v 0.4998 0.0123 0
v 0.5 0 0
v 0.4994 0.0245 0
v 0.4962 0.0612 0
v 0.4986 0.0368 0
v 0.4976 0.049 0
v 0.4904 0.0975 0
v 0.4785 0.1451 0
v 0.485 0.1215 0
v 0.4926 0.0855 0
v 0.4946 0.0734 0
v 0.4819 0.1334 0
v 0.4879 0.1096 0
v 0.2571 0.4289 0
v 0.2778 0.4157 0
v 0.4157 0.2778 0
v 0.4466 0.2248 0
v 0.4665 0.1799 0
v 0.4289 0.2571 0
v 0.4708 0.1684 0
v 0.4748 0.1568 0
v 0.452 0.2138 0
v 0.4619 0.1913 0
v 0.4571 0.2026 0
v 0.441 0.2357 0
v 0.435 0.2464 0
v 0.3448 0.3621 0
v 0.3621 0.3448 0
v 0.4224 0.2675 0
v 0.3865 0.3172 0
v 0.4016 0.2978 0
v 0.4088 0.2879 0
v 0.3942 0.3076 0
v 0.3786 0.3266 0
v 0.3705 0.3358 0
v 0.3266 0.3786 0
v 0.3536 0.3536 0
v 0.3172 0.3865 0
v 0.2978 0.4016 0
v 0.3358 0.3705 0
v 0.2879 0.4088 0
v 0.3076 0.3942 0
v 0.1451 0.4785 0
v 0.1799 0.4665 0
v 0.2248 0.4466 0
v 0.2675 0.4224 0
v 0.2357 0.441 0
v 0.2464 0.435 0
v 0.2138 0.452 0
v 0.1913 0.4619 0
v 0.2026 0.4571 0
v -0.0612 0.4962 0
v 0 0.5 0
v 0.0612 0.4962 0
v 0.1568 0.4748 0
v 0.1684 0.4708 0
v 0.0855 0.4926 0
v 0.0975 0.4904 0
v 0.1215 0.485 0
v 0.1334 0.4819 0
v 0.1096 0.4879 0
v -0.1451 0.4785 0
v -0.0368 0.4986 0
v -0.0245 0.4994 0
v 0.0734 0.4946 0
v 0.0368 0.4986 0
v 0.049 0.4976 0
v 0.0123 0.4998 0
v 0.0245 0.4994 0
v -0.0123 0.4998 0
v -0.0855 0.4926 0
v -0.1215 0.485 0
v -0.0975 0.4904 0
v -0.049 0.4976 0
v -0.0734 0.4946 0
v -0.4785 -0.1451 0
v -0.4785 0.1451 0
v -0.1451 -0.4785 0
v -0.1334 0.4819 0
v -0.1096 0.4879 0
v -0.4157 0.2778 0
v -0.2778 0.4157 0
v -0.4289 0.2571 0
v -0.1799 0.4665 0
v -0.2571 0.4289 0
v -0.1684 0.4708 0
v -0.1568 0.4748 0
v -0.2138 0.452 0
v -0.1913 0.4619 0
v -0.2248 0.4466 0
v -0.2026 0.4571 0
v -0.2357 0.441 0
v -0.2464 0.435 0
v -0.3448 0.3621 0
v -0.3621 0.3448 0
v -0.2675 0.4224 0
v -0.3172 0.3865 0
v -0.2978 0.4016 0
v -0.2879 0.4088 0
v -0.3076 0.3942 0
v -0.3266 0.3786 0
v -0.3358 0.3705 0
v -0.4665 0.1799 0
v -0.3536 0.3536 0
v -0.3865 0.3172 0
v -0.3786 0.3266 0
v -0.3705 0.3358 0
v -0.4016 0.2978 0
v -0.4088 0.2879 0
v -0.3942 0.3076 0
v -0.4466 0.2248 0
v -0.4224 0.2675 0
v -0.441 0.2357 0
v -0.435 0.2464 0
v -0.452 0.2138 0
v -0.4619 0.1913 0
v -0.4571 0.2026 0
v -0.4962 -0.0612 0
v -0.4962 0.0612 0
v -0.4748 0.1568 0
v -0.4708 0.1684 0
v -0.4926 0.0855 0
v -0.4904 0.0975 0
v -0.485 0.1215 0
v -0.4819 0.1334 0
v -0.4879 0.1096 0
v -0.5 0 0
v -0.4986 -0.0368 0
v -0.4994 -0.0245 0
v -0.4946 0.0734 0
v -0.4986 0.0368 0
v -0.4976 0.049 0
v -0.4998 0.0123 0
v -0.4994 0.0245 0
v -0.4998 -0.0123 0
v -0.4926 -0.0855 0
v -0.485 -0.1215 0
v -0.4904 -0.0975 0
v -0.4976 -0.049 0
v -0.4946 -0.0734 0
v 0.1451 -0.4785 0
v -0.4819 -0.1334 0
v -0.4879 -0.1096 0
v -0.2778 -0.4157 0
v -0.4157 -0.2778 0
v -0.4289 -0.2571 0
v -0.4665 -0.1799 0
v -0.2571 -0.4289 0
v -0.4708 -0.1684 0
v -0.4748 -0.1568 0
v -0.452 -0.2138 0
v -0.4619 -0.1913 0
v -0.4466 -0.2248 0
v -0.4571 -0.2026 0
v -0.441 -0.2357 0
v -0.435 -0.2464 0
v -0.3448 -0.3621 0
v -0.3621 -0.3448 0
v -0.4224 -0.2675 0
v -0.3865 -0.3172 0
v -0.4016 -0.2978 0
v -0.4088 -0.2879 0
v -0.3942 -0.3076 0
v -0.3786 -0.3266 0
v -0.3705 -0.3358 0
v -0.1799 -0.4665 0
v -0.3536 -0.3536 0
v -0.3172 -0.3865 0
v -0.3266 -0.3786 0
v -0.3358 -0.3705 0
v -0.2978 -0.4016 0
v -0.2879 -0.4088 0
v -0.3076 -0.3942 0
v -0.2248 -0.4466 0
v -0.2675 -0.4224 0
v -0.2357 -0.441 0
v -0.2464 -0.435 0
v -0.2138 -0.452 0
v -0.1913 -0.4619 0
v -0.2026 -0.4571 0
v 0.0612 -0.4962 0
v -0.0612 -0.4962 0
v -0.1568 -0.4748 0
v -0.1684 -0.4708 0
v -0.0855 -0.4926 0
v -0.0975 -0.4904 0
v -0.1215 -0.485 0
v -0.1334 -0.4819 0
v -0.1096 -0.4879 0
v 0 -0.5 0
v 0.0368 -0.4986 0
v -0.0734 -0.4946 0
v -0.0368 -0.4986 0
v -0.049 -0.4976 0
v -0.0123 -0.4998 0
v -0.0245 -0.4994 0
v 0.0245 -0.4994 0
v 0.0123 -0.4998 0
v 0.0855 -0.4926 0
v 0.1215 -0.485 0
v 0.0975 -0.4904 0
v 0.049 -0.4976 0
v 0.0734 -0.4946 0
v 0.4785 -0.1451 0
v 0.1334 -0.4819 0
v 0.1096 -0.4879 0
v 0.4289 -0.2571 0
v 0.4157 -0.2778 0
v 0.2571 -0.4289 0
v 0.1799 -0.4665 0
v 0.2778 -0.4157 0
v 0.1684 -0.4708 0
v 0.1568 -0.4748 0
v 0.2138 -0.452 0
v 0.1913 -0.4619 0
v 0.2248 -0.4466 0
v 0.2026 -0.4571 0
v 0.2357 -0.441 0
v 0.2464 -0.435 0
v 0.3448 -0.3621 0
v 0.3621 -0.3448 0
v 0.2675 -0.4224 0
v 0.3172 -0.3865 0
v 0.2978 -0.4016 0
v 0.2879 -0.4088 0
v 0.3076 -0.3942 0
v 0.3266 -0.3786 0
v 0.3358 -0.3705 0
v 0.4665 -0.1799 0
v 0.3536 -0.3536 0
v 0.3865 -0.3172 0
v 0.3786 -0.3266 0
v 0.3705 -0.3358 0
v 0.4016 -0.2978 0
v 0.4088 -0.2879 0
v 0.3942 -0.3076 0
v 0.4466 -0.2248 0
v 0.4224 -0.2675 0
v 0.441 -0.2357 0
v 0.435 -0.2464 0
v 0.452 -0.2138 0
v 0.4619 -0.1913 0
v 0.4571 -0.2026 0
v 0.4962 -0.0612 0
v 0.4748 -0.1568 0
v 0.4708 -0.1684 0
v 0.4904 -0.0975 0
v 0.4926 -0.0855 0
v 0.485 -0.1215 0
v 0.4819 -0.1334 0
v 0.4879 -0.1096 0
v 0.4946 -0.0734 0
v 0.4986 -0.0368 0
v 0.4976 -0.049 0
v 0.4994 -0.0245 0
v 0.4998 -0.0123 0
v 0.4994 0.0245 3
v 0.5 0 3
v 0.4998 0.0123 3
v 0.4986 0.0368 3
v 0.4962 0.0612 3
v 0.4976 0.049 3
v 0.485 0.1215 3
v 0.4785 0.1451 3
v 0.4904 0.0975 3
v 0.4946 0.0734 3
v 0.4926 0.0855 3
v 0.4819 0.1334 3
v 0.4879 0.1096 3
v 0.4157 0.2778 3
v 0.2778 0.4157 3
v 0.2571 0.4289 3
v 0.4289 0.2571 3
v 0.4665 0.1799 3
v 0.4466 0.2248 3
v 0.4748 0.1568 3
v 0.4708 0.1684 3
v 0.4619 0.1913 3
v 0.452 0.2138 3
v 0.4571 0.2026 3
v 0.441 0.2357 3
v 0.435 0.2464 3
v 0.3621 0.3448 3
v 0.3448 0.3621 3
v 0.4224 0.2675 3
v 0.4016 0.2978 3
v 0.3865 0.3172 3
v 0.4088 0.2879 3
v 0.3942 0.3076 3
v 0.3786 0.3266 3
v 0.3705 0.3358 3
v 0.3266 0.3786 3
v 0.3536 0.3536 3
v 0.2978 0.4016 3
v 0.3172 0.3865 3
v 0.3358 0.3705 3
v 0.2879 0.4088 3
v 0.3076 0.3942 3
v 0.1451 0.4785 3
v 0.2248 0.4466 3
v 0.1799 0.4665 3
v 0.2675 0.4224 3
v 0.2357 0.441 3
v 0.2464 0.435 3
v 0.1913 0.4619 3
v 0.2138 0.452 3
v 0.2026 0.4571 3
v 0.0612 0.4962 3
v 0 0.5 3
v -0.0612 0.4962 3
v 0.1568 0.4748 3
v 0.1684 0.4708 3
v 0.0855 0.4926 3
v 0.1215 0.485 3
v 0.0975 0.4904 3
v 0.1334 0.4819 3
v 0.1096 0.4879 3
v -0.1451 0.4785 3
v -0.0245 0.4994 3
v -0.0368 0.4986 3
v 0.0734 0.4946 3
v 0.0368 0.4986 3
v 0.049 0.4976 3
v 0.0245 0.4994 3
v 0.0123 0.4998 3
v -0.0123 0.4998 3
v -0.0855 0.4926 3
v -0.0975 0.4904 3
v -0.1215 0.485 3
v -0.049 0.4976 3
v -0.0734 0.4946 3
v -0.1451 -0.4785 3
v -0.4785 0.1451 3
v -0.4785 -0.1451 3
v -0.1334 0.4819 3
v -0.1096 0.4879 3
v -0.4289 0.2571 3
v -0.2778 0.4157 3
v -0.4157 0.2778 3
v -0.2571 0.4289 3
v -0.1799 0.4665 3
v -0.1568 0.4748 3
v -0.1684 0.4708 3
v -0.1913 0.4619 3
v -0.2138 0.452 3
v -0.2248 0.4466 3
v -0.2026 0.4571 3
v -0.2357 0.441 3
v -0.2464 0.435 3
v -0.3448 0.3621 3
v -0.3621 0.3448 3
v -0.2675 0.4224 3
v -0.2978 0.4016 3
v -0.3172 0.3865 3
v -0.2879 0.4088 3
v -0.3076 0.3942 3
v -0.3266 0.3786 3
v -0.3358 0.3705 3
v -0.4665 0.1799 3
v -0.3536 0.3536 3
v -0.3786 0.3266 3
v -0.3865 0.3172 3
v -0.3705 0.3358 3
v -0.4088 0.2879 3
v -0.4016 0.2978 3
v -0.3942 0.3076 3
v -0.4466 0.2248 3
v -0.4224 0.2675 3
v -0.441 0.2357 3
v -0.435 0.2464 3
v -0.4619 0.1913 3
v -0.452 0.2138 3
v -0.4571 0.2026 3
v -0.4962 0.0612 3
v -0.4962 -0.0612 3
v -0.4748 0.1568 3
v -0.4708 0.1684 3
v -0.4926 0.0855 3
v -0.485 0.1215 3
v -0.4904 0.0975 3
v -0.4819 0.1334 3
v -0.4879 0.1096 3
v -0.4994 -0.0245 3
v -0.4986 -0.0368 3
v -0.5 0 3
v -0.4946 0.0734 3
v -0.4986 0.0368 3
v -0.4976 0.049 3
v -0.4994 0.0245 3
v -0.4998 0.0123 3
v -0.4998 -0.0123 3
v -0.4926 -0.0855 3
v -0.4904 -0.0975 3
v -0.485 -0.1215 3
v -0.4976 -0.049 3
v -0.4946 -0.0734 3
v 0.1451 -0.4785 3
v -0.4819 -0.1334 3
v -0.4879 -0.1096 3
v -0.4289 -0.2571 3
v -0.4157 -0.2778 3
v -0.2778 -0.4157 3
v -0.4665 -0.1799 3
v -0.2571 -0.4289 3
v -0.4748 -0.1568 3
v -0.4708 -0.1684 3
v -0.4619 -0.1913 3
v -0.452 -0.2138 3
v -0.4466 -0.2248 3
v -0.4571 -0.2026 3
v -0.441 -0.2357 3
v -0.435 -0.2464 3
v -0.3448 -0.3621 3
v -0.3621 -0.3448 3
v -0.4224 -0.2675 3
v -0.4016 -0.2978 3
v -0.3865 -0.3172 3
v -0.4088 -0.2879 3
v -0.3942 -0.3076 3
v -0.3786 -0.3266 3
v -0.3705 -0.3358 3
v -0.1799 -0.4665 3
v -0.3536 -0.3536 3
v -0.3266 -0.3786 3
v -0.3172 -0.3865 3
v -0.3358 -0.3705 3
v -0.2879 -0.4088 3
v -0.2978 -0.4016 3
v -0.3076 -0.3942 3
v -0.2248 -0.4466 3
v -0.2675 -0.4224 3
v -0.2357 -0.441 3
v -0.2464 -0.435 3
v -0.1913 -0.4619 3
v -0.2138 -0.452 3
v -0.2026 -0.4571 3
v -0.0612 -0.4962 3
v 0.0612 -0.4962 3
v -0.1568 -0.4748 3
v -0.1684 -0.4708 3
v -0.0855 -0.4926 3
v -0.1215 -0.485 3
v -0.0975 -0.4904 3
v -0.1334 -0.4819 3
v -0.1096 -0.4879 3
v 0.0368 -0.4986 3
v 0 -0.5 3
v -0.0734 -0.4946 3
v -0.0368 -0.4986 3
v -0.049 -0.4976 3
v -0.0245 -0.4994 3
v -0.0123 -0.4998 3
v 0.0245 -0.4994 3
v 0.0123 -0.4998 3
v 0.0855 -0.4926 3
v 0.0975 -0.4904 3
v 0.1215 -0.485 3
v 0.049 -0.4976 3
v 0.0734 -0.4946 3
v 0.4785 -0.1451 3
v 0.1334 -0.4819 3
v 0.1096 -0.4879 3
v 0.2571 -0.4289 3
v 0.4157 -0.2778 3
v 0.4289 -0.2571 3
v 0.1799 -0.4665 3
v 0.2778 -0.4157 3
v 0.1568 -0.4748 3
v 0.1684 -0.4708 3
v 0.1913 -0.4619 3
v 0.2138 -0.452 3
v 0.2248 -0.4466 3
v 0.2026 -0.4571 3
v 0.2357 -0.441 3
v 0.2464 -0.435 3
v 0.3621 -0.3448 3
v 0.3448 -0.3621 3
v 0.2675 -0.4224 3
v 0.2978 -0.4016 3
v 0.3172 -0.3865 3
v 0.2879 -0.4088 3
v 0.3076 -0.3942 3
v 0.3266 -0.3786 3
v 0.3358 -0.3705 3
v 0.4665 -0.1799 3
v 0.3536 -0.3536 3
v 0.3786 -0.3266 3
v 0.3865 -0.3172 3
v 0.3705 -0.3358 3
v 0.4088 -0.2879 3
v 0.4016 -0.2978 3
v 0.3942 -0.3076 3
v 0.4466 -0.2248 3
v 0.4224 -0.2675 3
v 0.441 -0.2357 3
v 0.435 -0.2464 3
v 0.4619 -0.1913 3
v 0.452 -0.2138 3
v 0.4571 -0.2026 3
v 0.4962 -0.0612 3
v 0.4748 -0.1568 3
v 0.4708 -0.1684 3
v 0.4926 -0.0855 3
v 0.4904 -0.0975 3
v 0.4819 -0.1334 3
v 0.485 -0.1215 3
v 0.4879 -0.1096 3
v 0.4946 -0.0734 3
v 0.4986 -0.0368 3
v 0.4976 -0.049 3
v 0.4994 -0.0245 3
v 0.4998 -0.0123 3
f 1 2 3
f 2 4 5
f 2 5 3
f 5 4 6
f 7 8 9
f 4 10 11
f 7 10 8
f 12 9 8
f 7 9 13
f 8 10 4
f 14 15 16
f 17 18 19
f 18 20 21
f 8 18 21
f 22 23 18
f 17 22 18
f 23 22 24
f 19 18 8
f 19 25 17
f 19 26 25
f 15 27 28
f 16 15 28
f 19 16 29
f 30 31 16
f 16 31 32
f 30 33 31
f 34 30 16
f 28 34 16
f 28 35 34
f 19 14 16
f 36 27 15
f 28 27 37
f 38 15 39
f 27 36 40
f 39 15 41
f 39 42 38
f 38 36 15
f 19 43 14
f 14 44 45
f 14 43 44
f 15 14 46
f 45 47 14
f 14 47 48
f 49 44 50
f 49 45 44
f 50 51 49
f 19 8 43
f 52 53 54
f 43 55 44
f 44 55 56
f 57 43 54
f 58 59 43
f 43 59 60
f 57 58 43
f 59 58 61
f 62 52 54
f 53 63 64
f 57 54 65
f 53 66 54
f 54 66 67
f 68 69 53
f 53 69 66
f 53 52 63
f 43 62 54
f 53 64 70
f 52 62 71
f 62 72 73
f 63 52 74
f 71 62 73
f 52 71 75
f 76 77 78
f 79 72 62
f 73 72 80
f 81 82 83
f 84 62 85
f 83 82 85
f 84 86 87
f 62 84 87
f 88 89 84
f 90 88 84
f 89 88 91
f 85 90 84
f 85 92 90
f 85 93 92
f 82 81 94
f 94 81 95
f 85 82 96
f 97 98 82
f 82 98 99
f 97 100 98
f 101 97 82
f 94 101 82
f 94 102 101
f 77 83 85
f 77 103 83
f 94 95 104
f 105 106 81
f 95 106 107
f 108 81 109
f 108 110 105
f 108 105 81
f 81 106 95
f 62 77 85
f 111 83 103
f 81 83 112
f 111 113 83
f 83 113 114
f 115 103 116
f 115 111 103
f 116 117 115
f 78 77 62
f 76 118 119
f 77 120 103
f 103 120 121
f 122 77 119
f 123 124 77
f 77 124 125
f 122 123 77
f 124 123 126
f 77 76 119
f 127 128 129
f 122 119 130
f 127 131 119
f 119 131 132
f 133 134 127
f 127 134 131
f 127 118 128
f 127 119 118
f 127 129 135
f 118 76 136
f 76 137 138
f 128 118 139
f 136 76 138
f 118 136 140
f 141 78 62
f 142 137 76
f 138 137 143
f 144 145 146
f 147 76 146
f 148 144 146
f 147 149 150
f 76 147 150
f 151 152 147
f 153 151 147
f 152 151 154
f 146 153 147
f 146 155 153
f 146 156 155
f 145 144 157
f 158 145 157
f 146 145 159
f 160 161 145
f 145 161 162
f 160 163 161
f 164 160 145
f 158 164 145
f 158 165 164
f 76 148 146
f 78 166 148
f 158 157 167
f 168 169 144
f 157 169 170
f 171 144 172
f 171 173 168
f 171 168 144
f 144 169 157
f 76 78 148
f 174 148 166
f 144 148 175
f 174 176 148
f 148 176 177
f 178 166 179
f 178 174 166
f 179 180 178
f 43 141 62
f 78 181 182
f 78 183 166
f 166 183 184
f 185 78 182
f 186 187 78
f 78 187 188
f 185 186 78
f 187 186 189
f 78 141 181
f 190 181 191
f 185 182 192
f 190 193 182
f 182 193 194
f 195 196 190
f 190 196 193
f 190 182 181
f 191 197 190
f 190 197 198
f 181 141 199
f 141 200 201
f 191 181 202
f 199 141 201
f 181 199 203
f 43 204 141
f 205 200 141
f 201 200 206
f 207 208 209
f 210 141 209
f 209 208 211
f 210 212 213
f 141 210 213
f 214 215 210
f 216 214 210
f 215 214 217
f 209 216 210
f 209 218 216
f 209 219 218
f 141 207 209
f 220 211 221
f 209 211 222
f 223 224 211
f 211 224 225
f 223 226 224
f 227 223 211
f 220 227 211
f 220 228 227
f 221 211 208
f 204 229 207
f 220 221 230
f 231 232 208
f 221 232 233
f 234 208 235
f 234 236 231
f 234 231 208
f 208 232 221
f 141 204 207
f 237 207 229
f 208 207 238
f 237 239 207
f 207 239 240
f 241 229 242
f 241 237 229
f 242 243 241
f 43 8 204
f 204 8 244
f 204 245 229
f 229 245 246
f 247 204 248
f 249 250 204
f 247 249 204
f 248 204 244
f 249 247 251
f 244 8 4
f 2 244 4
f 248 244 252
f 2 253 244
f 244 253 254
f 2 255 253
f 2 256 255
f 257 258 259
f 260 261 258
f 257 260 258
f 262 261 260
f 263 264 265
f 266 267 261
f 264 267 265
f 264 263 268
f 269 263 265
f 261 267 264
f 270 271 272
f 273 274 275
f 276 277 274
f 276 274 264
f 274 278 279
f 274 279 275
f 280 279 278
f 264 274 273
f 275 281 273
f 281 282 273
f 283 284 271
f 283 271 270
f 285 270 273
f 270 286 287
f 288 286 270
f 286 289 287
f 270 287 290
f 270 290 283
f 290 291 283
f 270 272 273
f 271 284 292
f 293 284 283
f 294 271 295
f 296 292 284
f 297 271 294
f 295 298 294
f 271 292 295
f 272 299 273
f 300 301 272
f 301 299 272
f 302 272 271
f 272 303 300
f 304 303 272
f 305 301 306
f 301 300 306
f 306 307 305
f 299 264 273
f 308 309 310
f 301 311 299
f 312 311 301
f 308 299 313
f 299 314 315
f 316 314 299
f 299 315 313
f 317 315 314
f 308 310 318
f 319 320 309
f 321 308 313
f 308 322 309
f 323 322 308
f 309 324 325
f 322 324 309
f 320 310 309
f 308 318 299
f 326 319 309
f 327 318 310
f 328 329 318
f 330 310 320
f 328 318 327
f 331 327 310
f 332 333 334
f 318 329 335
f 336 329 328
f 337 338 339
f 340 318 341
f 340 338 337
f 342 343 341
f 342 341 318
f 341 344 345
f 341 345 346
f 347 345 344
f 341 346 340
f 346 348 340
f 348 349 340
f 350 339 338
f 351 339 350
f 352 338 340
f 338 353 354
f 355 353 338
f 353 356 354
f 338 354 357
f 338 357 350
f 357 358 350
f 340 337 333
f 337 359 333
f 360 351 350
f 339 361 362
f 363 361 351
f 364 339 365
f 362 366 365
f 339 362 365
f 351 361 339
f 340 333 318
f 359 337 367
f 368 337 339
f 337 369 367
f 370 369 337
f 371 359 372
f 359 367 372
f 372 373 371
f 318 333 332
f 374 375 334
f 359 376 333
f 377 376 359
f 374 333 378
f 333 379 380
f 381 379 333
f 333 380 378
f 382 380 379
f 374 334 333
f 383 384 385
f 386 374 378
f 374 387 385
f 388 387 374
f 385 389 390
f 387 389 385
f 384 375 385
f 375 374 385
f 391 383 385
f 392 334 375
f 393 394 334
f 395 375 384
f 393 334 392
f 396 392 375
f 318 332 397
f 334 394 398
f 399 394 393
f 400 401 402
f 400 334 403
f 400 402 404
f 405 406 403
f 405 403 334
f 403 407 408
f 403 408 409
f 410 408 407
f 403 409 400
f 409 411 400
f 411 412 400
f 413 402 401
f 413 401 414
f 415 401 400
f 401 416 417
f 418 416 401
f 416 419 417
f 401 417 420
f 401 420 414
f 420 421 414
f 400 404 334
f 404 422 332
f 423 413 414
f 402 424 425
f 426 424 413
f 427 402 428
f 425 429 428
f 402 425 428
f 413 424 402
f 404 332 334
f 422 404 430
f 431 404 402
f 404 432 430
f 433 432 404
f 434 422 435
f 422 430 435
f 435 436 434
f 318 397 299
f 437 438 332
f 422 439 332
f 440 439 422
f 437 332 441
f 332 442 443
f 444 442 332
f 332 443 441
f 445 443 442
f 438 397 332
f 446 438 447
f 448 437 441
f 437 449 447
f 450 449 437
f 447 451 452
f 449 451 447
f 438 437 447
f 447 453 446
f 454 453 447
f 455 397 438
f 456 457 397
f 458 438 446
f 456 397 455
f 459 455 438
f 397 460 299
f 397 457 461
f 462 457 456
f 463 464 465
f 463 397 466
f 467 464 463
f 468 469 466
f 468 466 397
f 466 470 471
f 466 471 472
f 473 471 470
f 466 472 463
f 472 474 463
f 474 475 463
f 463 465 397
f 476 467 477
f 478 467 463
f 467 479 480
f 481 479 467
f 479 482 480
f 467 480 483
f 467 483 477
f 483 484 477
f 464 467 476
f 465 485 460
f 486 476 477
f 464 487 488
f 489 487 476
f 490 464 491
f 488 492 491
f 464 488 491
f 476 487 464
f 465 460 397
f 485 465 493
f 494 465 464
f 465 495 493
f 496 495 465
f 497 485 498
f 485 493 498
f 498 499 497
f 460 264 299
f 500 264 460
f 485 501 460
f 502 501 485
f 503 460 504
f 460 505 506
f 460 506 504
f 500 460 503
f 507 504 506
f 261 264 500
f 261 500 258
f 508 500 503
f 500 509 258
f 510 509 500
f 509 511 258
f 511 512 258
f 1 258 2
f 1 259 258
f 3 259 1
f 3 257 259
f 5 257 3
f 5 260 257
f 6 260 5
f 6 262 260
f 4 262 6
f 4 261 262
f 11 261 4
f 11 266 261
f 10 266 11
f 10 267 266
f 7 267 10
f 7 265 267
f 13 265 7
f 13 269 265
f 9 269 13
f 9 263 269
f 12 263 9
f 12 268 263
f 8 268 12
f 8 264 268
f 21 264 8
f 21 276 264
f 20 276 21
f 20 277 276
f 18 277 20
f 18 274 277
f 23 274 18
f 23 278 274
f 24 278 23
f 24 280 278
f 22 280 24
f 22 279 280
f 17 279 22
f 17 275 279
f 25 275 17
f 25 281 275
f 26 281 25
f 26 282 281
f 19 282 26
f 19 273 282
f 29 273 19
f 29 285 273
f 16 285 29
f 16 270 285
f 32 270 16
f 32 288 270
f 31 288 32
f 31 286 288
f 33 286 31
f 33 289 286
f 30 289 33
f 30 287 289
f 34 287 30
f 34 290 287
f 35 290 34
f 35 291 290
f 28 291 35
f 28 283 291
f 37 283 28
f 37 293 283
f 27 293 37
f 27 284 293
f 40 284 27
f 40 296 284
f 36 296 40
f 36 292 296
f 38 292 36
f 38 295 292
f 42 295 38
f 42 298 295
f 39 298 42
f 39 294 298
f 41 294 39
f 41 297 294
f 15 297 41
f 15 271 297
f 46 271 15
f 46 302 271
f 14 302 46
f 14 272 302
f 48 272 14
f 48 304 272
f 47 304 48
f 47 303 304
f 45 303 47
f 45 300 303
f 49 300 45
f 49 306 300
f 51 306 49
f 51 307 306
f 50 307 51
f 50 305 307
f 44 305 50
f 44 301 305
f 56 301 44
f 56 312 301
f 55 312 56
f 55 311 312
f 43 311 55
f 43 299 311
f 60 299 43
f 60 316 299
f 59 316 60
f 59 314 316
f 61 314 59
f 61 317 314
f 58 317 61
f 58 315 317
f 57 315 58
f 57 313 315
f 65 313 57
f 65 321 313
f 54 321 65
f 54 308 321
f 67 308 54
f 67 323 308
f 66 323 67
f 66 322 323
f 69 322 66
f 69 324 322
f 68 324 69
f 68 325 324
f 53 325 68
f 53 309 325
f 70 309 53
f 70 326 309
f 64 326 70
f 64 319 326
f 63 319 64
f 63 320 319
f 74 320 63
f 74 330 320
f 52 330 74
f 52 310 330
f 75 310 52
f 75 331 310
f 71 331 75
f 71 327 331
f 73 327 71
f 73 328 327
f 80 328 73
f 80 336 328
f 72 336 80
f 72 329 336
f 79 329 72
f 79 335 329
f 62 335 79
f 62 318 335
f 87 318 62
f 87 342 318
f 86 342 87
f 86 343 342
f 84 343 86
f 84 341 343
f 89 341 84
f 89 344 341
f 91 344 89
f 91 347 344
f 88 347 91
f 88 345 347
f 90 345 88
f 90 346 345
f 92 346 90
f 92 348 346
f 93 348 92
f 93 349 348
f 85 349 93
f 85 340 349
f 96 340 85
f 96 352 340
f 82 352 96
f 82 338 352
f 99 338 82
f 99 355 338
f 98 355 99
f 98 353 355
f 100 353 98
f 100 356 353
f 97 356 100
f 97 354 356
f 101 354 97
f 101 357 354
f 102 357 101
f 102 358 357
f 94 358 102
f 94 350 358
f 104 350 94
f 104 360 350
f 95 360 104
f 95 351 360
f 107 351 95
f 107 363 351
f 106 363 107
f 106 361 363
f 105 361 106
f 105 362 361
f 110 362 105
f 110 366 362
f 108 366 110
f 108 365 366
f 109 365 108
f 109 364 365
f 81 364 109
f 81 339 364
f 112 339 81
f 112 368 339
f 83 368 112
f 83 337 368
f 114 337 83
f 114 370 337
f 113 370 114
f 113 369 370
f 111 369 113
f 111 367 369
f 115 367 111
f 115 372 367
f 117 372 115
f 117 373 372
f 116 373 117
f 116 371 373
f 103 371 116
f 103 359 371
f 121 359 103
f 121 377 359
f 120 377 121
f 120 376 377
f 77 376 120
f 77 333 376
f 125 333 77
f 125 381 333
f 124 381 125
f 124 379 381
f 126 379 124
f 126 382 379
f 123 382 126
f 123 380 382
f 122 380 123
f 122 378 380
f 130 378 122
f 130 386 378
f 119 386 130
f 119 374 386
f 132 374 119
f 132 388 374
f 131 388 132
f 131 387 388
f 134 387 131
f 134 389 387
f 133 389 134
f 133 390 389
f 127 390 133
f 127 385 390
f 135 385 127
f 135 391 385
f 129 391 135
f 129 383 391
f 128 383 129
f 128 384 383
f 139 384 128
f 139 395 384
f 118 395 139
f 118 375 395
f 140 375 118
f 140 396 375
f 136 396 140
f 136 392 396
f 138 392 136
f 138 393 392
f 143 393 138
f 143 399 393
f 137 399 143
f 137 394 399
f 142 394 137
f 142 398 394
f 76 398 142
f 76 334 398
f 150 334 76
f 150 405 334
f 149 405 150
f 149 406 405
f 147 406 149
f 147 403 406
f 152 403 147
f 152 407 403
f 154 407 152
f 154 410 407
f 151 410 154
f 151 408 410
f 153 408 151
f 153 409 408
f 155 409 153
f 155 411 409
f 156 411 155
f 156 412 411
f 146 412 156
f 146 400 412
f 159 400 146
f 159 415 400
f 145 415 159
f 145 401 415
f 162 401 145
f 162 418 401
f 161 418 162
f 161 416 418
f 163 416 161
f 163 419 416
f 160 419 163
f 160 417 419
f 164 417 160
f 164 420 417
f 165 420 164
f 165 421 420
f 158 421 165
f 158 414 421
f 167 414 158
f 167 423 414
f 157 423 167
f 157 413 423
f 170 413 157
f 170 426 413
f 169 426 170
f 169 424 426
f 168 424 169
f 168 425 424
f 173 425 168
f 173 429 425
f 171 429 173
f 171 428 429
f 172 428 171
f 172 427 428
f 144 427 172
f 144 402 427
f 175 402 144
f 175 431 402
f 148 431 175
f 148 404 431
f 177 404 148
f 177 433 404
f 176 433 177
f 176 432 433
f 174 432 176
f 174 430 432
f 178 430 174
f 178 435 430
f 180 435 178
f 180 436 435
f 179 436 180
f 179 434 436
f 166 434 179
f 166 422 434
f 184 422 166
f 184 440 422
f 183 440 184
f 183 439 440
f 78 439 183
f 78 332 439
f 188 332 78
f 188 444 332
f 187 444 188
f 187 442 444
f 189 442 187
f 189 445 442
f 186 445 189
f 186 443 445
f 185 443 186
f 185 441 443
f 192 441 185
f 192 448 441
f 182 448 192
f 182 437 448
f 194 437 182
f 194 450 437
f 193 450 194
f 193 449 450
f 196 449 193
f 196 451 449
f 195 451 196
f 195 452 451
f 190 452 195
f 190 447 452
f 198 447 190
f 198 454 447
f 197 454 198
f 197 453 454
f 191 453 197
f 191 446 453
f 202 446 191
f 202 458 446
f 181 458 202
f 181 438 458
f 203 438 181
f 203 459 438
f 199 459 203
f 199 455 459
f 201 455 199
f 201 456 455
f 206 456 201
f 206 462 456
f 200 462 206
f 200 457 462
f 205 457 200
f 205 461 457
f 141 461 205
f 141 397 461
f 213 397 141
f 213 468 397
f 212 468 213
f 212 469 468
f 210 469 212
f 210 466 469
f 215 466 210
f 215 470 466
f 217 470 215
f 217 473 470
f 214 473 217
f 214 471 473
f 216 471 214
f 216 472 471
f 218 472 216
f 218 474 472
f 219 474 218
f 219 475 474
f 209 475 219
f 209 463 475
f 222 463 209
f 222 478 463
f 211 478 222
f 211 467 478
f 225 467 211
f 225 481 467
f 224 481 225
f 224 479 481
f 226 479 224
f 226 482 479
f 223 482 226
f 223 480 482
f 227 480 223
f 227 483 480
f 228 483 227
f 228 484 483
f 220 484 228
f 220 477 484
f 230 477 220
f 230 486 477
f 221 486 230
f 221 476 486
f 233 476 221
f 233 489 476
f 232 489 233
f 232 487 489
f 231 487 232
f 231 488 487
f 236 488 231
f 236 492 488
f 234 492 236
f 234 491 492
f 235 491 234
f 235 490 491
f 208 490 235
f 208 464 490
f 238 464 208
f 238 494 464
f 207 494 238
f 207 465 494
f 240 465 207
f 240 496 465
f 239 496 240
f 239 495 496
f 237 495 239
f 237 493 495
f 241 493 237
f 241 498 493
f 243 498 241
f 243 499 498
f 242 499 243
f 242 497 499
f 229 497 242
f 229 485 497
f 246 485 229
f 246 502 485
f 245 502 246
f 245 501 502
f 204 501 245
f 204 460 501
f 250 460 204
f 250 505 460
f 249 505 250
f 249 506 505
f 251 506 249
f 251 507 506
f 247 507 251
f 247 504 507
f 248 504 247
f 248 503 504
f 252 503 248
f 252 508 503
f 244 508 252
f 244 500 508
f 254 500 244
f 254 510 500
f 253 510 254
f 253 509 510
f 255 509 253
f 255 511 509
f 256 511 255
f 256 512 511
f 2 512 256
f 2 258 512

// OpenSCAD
// Cylinder for Stacks of Shapes
// by Slashee the Cow
$fn = 256;

color("Teal")
linear_extrude(3)
    circle(d=1);
